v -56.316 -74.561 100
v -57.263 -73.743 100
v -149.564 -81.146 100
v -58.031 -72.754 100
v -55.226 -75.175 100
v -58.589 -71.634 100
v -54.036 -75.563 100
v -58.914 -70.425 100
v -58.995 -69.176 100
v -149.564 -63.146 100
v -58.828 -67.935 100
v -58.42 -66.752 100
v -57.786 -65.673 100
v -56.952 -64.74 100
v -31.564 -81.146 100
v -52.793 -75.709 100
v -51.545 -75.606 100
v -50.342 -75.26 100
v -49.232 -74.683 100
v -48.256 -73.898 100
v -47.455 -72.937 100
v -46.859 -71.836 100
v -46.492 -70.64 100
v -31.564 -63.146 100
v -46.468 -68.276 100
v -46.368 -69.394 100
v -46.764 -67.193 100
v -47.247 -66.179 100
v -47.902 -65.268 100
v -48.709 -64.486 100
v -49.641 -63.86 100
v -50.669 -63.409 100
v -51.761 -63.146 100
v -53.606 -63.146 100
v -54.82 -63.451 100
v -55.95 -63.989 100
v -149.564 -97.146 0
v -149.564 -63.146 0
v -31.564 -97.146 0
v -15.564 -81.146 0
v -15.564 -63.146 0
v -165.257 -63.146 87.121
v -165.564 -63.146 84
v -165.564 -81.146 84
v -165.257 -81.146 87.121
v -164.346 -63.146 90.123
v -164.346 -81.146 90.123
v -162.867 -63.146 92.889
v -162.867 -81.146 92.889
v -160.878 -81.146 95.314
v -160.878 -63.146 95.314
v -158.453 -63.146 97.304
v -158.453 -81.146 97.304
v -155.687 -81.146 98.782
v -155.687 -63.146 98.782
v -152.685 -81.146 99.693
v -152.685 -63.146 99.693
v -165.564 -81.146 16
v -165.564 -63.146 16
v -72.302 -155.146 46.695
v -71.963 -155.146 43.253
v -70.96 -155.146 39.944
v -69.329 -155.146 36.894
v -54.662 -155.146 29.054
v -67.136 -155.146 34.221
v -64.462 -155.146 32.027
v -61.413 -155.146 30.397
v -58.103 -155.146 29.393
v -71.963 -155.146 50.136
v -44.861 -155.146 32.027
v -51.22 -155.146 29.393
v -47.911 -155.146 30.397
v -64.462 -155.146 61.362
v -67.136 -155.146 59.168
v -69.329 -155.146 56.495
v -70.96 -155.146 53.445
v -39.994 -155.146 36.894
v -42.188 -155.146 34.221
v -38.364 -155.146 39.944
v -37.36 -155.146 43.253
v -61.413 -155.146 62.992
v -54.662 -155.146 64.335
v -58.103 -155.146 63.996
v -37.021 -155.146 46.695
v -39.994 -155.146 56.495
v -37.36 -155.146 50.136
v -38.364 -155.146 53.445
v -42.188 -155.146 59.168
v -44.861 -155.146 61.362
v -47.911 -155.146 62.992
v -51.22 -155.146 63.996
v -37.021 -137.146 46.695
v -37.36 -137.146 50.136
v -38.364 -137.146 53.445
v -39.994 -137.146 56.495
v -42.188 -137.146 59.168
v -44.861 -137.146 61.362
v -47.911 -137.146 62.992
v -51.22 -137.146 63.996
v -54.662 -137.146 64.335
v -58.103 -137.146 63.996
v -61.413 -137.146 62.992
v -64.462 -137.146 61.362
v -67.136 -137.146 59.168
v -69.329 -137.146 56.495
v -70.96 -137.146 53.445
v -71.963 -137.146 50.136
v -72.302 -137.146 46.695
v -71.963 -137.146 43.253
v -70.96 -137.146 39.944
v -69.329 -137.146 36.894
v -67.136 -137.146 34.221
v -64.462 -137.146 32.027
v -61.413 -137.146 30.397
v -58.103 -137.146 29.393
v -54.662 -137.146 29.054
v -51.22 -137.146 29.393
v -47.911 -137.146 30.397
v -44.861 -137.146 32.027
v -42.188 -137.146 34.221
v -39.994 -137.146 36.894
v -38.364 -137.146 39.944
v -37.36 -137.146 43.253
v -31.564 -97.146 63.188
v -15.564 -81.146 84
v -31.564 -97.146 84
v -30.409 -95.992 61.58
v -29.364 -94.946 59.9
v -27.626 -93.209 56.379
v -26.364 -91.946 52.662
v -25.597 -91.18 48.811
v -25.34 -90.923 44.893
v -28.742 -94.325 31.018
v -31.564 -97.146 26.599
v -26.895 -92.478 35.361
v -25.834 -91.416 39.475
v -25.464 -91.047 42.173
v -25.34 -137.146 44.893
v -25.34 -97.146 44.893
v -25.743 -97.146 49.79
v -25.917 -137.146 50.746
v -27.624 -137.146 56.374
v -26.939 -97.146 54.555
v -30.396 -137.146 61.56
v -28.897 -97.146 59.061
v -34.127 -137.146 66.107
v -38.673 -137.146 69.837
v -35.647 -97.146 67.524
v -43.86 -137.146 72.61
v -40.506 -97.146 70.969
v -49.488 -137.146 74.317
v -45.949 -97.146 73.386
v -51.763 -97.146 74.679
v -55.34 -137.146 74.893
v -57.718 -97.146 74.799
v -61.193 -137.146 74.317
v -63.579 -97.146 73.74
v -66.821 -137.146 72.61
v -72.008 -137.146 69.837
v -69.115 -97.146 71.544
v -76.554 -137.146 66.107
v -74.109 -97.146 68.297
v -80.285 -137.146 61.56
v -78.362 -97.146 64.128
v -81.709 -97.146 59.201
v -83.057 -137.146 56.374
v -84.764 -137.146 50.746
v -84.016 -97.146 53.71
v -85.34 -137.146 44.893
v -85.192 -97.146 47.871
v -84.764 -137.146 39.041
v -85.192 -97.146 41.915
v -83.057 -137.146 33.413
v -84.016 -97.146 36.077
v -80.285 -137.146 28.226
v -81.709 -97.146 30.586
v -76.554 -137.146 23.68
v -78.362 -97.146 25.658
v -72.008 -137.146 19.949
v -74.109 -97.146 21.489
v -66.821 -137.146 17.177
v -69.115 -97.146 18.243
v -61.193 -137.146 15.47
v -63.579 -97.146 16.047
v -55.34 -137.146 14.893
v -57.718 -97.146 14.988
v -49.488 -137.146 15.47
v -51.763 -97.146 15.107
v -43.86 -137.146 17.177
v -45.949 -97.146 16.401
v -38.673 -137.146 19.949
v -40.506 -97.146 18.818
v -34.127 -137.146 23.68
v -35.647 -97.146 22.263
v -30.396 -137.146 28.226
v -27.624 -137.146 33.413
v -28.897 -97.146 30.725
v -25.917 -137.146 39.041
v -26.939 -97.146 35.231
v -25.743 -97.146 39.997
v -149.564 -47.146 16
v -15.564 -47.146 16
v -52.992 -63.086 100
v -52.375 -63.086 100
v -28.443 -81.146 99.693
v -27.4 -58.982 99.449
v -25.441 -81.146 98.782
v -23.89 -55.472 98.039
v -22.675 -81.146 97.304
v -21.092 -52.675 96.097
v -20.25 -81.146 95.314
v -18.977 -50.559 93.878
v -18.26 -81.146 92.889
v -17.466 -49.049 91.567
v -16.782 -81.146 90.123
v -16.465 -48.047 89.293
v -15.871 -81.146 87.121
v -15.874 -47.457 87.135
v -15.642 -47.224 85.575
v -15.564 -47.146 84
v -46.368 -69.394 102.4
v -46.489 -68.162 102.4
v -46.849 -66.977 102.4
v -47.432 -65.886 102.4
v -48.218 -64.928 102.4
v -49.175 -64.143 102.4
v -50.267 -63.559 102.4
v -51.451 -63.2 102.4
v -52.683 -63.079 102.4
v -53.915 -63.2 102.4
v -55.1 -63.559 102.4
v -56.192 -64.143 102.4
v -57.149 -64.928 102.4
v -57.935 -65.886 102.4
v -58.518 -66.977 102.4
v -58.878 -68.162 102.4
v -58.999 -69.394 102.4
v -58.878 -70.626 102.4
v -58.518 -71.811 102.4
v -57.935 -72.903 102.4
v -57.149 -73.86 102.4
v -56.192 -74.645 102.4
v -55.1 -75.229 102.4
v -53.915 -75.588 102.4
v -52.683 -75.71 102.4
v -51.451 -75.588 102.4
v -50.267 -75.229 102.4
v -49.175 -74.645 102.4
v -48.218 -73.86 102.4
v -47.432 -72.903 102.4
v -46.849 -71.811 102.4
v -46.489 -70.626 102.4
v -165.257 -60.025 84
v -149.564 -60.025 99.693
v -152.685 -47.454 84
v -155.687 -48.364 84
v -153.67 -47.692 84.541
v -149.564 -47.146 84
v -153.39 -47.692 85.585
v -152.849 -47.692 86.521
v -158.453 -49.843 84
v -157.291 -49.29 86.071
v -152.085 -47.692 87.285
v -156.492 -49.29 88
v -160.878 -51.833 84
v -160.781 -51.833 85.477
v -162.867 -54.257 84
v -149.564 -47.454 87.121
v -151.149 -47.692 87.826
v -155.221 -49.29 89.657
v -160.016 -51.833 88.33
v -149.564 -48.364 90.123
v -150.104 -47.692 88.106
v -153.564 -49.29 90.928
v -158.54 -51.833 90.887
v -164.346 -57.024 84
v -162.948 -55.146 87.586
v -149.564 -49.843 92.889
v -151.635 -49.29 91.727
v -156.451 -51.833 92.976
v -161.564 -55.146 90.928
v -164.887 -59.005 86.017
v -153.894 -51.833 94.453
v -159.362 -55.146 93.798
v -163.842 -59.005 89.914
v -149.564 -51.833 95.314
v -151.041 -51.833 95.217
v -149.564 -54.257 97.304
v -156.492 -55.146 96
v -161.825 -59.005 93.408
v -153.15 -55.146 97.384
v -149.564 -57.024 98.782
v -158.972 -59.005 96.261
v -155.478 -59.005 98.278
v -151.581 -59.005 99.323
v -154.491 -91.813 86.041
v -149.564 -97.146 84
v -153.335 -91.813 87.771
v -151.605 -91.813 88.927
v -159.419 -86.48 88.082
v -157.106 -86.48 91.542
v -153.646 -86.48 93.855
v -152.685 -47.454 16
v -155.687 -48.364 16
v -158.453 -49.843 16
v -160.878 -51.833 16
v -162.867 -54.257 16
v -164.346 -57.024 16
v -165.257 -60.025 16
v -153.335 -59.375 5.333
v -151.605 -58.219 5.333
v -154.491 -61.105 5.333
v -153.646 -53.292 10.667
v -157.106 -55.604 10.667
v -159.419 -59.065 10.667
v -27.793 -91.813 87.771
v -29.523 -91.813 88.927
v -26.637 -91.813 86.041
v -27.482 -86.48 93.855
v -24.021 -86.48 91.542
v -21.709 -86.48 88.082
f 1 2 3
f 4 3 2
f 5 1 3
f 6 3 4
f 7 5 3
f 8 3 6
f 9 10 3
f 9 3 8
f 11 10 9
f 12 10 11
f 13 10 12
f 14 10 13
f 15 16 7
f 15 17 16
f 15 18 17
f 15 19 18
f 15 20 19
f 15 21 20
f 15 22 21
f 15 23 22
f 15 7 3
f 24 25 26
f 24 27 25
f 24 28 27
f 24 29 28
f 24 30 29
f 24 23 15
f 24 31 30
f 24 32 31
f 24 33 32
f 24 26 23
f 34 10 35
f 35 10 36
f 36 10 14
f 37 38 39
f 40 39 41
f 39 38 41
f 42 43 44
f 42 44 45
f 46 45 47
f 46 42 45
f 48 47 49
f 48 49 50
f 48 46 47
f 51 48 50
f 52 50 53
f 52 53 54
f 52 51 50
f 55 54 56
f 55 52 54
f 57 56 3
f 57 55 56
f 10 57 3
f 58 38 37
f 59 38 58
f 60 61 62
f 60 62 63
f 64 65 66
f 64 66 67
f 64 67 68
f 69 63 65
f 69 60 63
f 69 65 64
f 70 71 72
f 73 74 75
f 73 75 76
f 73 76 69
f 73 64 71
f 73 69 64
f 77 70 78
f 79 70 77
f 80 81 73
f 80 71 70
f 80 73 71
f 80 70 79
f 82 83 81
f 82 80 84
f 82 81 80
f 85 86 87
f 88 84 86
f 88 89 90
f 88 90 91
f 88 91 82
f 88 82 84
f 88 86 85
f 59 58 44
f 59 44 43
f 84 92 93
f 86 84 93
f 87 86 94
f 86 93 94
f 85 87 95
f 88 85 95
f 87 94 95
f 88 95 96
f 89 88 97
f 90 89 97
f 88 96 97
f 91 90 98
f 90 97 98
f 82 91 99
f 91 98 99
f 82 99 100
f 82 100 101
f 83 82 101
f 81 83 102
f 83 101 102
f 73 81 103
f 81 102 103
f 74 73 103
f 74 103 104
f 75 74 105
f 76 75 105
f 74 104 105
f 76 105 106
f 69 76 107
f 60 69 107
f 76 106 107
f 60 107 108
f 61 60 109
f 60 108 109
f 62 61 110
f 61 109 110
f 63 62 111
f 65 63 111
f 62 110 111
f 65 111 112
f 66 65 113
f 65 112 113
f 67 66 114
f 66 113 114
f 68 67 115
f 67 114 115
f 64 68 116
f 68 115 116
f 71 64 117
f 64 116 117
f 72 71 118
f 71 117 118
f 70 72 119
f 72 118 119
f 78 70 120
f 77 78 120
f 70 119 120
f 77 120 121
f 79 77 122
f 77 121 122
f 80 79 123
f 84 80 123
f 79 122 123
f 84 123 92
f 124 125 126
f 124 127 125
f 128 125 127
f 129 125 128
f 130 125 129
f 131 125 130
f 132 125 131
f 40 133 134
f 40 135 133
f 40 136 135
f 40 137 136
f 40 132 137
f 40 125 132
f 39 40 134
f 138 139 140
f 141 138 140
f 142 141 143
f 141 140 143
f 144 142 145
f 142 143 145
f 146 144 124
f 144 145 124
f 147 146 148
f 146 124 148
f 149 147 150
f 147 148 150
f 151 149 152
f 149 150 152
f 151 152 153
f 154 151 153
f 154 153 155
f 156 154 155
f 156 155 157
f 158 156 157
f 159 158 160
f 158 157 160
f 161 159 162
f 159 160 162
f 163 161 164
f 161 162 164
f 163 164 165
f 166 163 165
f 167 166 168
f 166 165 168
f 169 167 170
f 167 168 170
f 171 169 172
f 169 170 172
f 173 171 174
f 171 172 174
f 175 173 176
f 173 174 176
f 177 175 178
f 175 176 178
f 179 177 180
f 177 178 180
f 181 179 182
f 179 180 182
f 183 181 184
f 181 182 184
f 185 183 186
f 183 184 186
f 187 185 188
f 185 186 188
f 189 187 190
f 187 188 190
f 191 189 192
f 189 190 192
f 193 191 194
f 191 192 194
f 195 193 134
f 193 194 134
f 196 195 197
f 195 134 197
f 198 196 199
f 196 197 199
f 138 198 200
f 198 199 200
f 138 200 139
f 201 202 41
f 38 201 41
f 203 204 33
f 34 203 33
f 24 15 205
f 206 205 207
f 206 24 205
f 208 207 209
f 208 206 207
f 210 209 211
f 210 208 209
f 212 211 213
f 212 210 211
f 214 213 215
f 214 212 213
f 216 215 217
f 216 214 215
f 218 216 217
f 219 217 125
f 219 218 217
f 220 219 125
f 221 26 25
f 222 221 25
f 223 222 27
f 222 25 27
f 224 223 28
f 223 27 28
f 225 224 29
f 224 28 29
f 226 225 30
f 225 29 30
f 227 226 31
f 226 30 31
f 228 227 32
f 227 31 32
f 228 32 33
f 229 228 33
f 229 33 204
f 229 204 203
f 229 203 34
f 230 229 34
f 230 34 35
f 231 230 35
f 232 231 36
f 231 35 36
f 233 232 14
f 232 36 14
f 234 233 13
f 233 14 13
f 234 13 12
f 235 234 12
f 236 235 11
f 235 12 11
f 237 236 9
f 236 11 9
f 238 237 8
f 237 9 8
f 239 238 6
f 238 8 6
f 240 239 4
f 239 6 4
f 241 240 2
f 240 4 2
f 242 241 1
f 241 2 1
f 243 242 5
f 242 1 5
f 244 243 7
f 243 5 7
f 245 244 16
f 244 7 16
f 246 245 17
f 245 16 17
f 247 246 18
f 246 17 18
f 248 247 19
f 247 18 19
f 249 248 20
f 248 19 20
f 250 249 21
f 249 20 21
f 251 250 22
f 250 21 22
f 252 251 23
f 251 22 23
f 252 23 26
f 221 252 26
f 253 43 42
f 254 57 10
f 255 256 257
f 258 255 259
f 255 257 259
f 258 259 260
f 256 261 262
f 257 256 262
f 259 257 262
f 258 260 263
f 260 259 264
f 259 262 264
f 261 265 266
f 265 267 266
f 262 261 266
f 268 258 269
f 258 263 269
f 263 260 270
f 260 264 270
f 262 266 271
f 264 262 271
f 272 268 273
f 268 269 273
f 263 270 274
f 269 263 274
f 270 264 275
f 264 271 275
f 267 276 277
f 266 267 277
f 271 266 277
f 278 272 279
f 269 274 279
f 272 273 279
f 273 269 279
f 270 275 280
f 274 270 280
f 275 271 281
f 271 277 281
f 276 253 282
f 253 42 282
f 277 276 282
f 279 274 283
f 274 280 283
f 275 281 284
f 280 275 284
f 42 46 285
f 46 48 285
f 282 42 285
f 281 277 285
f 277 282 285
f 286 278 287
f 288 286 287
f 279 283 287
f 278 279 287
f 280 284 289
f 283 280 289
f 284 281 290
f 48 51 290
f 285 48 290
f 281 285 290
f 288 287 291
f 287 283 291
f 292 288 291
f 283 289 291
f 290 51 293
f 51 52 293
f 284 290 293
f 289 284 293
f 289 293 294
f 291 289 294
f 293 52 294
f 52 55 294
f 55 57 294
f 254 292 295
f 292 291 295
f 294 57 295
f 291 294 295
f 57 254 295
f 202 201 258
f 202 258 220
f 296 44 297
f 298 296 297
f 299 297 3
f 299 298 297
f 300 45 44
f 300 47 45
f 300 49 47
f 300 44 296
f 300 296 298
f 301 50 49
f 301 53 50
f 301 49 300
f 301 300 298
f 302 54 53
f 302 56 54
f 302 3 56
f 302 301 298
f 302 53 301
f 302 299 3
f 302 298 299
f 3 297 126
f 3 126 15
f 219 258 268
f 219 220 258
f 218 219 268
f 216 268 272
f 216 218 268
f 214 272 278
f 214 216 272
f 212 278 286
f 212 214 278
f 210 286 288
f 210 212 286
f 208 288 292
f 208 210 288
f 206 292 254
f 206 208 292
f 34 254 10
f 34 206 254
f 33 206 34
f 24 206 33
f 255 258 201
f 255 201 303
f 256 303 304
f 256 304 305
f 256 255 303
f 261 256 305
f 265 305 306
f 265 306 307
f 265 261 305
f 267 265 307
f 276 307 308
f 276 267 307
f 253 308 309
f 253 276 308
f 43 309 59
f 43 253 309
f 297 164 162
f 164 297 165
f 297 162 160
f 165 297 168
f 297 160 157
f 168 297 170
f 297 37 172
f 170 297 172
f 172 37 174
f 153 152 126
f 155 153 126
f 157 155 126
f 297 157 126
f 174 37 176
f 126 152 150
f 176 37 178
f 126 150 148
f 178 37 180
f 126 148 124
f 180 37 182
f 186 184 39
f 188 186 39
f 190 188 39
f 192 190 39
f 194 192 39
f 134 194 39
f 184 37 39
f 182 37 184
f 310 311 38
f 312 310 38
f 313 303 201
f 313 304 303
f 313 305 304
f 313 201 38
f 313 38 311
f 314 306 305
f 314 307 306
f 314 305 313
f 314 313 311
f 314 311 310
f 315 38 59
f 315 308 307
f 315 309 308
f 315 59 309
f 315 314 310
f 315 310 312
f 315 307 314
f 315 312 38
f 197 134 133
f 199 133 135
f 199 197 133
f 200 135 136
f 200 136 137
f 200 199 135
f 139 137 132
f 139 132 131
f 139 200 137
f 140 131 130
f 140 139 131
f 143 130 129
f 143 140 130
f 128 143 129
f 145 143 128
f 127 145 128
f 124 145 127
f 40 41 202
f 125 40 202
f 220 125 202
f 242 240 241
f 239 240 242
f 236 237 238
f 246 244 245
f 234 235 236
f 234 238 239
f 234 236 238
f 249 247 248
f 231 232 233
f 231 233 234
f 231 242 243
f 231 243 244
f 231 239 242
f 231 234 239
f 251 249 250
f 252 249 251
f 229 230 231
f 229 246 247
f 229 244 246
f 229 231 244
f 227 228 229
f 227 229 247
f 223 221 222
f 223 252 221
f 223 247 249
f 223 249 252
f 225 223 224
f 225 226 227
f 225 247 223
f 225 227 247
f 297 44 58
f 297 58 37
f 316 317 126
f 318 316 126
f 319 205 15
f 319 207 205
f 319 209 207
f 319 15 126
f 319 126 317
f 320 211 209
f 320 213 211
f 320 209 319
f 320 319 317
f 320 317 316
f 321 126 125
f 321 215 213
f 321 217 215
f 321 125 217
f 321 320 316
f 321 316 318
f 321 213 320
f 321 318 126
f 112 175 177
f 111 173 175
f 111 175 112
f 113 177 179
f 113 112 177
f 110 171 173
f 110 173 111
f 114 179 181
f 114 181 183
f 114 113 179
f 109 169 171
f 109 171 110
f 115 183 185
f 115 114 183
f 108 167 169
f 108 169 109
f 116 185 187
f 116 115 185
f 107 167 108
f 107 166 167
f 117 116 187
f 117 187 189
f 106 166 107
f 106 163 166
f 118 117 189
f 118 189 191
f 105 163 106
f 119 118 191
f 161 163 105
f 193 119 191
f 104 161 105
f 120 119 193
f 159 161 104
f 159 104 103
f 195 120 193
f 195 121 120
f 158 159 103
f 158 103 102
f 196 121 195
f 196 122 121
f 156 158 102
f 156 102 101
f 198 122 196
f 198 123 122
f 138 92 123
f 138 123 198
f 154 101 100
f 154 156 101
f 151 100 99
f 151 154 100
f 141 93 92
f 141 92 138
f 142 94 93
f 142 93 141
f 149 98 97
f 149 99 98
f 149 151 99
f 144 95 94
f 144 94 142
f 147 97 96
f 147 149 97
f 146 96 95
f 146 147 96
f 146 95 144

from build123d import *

# Parameters (mm, degrees)
F0_W         = 150
F0_H         = 50
F1_DEPTH     = 100
F2_R         = 30
F3_DEPTH     = 40
F4_R         = 16
F5_R         = 16
F6_T1_DEPTH  = 75.1469278075
F6_T3_DEPTH  = 125.1469278075
F6_T5_DEPTH  = 175.1469278075
F6_T7_DEPTH  = 118
F6_T10_ANGLE = 90
F6_T12_ANGLE = 90
F6_T14_ANGLE = 90
F6_T18_DEPTH = 125.1469278075
F6_S19_R     = 30
F6_T20_DEPTH = 65
F7_R         = 6.3155551437
F8_DEPTH     = 2.4
F9_R         = 17.6407421848
F10_DEPTH    = 18


# Not quite as in the source:
# - a fillet or chamfer that OpenCascade refuses, or shapes differently, is made with other operations: its cross-section is extruded or revolved along the edge and cut away or added


with BuildPart() as f1:
    # F0 (on Top) → F1 (new body)
    with BuildSketch(Plane.XY):
        with Locations((-90.5639529228, -72.1464735391)):
            Rectangle(F0_W, F0_H)
    extrude(amount=F1_DEPTH)

    # F2 (on face) → F3 (join)
    with BuildSketch(Plane.XZ.offset(97.1464735391)):
        with Locations((-55.3404204547, 44.8933616281)):
            Circle(F2_R)
    extrude(amount=F3_DEPTH)

    # F4
    f4_edges = [f1.edges().sort_by_distance(p)[0] for p in [
        (-165.563953, -72.146474, 100),
    ]]
    fillet(f4_edges, radius=F4_R)

    # F5
    f5_edges = [f1.edges().sort_by_distance(p)[0] for p in [
        (-15.563953, -72.146474, 100),
        (-82.563953, -47.146474, 100),
    ]]
    fillet(f5_edges, radius=F5_R)

    # F6: chamfer of 16 on 4 edges, made by hand

    # F6_s2 → F6_t1 (cut)
    with BuildSketch(Plane.XZ.offset(63.1464735391)):
        Polygon((-149.5639529228, 0), (-165.5639529228, 16), (-165.5639529228, 0), align=None)
    extrude(amount=F6_T1_DEPTH, mode=Mode.SUBTRACT)

    # F6_s4 → F6_t3 (cut)
    with BuildSketch(Plane.XY.offset(-41.1469278075)):
        Polygon((-165.5639529228, -81.1464735391), (-149.5639529228, -97.1464735391), (-165.5639529228, -97.1464735391), align=None)
    extrude(amount=F6_T3_DEPTH, mode=Mode.SUBTRACT)

    # F6_s6 → F6_t5 (cut)
    with BuildSketch(Plane.YZ.offset(-149.5639529228)):
        Polygon((-47.1464735391, 16), (-63.1464735391, 0), (-47.1464735391, 0), align=None)
    extrude(amount=F6_T5_DEPTH, mode=Mode.SUBTRACT)

    # F6_s8 → F6_t7 (cut)
    with BuildSketch(Plane.YZ.offset(-149.5639529228)):
        Polygon((-97.1464735391, 84), (-81.1464735391, 100), (-97.1464735391, 100), align=None)
    extrude(amount=F6_T7_DEPTH, mode=Mode.SUBTRACT)

    # F6_s9 → F6_t10 (revolve, cut)
    with BuildSketch(Plane.YZ.offset(-149.5639529228)):
        Polygon((-63.1464735391, 0), (-47.1464735391, 16), (-47.1464735391, 0), align=None)
    revolve(axis=Axis((-149.5639529228, -63.1464735391, 0), (0, 0, 1)), revolution_arc=F6_T10_ANGLE, mode=Mode.SUBTRACT)

    # F6_s11 → F6_t12 (revolve, cut)
    with BuildSketch(Plane.XY.offset(84)):
        Polygon((-149.5639529228, -97.1464735391), (-165.5639529228, -81.1464735391), (-165.5639529228, -97.1464735391), align=None)
    revolve(axis=Axis((-149.5639529228, -97.1464735391, 84), (0, 1, 0)), revolution_arc=F6_T12_ANGLE, mode=Mode.SUBTRACT)

    # F6_s13 → F6_t14 (revolve, cut)
    with BuildSketch(Plane.YZ.offset(-31.5639529228)):
        Polygon((-97.1464735391, 84), (-81.1464735391, 100), (-97.1464735391, 100), align=None)
    revolve(axis=Axis((-31.5639529228, -97.1464735391, 84), (0, 1, 0)), revolution_arc=F6_T14_ANGLE, mode=Mode.SUBTRACT)


with BuildPart() as f6_tool16:
    # F6_s17 → F6_t18 (new body)
    with BuildSketch(Plane.XY.offset(-41.1469278075)):
        Polygon((-15.5639529228, -81.1464735391), (-31.5639529228, -97.1464735391), (-15.5639529228, -97.1464735391), align=None)
    extrude(amount=F6_T18_DEPTH)

    # F6_s19 → F6_t20 (cut, symmetric)
    with BuildSketch(Plane.XZ.offset(89.1)):
        with Locations((-55.3404204547, 44.8933616281)):
            Circle(F6_S19_R)
    extrude(amount=F6_T20_DEPTH, both=True, mode=Mode.SUBTRACT)


with BuildPart() as f1_1:
    add(f1.part)

    # F6_t15: cut F6_tool16
    add(f6_tool16.part, mode=Mode.SUBTRACT)

    # F7 (on face) → F8 (join)
    with BuildSketch(Plane.XY.offset(100)):
        with Locations((-52.6833832264, -69.3942382932)):
            Circle(F7_R)
    extrude(amount=F8_DEPTH)

    # F9 (on face) → F10 (join)
    with BuildSketch(Plane.XZ.offset(137.1464735391)):
        with Locations((-54.6616874635, 46.6945059597)):
            Circle(F9_R)
    extrude(amount=F10_DEPTH)


solid = f1_1.part
